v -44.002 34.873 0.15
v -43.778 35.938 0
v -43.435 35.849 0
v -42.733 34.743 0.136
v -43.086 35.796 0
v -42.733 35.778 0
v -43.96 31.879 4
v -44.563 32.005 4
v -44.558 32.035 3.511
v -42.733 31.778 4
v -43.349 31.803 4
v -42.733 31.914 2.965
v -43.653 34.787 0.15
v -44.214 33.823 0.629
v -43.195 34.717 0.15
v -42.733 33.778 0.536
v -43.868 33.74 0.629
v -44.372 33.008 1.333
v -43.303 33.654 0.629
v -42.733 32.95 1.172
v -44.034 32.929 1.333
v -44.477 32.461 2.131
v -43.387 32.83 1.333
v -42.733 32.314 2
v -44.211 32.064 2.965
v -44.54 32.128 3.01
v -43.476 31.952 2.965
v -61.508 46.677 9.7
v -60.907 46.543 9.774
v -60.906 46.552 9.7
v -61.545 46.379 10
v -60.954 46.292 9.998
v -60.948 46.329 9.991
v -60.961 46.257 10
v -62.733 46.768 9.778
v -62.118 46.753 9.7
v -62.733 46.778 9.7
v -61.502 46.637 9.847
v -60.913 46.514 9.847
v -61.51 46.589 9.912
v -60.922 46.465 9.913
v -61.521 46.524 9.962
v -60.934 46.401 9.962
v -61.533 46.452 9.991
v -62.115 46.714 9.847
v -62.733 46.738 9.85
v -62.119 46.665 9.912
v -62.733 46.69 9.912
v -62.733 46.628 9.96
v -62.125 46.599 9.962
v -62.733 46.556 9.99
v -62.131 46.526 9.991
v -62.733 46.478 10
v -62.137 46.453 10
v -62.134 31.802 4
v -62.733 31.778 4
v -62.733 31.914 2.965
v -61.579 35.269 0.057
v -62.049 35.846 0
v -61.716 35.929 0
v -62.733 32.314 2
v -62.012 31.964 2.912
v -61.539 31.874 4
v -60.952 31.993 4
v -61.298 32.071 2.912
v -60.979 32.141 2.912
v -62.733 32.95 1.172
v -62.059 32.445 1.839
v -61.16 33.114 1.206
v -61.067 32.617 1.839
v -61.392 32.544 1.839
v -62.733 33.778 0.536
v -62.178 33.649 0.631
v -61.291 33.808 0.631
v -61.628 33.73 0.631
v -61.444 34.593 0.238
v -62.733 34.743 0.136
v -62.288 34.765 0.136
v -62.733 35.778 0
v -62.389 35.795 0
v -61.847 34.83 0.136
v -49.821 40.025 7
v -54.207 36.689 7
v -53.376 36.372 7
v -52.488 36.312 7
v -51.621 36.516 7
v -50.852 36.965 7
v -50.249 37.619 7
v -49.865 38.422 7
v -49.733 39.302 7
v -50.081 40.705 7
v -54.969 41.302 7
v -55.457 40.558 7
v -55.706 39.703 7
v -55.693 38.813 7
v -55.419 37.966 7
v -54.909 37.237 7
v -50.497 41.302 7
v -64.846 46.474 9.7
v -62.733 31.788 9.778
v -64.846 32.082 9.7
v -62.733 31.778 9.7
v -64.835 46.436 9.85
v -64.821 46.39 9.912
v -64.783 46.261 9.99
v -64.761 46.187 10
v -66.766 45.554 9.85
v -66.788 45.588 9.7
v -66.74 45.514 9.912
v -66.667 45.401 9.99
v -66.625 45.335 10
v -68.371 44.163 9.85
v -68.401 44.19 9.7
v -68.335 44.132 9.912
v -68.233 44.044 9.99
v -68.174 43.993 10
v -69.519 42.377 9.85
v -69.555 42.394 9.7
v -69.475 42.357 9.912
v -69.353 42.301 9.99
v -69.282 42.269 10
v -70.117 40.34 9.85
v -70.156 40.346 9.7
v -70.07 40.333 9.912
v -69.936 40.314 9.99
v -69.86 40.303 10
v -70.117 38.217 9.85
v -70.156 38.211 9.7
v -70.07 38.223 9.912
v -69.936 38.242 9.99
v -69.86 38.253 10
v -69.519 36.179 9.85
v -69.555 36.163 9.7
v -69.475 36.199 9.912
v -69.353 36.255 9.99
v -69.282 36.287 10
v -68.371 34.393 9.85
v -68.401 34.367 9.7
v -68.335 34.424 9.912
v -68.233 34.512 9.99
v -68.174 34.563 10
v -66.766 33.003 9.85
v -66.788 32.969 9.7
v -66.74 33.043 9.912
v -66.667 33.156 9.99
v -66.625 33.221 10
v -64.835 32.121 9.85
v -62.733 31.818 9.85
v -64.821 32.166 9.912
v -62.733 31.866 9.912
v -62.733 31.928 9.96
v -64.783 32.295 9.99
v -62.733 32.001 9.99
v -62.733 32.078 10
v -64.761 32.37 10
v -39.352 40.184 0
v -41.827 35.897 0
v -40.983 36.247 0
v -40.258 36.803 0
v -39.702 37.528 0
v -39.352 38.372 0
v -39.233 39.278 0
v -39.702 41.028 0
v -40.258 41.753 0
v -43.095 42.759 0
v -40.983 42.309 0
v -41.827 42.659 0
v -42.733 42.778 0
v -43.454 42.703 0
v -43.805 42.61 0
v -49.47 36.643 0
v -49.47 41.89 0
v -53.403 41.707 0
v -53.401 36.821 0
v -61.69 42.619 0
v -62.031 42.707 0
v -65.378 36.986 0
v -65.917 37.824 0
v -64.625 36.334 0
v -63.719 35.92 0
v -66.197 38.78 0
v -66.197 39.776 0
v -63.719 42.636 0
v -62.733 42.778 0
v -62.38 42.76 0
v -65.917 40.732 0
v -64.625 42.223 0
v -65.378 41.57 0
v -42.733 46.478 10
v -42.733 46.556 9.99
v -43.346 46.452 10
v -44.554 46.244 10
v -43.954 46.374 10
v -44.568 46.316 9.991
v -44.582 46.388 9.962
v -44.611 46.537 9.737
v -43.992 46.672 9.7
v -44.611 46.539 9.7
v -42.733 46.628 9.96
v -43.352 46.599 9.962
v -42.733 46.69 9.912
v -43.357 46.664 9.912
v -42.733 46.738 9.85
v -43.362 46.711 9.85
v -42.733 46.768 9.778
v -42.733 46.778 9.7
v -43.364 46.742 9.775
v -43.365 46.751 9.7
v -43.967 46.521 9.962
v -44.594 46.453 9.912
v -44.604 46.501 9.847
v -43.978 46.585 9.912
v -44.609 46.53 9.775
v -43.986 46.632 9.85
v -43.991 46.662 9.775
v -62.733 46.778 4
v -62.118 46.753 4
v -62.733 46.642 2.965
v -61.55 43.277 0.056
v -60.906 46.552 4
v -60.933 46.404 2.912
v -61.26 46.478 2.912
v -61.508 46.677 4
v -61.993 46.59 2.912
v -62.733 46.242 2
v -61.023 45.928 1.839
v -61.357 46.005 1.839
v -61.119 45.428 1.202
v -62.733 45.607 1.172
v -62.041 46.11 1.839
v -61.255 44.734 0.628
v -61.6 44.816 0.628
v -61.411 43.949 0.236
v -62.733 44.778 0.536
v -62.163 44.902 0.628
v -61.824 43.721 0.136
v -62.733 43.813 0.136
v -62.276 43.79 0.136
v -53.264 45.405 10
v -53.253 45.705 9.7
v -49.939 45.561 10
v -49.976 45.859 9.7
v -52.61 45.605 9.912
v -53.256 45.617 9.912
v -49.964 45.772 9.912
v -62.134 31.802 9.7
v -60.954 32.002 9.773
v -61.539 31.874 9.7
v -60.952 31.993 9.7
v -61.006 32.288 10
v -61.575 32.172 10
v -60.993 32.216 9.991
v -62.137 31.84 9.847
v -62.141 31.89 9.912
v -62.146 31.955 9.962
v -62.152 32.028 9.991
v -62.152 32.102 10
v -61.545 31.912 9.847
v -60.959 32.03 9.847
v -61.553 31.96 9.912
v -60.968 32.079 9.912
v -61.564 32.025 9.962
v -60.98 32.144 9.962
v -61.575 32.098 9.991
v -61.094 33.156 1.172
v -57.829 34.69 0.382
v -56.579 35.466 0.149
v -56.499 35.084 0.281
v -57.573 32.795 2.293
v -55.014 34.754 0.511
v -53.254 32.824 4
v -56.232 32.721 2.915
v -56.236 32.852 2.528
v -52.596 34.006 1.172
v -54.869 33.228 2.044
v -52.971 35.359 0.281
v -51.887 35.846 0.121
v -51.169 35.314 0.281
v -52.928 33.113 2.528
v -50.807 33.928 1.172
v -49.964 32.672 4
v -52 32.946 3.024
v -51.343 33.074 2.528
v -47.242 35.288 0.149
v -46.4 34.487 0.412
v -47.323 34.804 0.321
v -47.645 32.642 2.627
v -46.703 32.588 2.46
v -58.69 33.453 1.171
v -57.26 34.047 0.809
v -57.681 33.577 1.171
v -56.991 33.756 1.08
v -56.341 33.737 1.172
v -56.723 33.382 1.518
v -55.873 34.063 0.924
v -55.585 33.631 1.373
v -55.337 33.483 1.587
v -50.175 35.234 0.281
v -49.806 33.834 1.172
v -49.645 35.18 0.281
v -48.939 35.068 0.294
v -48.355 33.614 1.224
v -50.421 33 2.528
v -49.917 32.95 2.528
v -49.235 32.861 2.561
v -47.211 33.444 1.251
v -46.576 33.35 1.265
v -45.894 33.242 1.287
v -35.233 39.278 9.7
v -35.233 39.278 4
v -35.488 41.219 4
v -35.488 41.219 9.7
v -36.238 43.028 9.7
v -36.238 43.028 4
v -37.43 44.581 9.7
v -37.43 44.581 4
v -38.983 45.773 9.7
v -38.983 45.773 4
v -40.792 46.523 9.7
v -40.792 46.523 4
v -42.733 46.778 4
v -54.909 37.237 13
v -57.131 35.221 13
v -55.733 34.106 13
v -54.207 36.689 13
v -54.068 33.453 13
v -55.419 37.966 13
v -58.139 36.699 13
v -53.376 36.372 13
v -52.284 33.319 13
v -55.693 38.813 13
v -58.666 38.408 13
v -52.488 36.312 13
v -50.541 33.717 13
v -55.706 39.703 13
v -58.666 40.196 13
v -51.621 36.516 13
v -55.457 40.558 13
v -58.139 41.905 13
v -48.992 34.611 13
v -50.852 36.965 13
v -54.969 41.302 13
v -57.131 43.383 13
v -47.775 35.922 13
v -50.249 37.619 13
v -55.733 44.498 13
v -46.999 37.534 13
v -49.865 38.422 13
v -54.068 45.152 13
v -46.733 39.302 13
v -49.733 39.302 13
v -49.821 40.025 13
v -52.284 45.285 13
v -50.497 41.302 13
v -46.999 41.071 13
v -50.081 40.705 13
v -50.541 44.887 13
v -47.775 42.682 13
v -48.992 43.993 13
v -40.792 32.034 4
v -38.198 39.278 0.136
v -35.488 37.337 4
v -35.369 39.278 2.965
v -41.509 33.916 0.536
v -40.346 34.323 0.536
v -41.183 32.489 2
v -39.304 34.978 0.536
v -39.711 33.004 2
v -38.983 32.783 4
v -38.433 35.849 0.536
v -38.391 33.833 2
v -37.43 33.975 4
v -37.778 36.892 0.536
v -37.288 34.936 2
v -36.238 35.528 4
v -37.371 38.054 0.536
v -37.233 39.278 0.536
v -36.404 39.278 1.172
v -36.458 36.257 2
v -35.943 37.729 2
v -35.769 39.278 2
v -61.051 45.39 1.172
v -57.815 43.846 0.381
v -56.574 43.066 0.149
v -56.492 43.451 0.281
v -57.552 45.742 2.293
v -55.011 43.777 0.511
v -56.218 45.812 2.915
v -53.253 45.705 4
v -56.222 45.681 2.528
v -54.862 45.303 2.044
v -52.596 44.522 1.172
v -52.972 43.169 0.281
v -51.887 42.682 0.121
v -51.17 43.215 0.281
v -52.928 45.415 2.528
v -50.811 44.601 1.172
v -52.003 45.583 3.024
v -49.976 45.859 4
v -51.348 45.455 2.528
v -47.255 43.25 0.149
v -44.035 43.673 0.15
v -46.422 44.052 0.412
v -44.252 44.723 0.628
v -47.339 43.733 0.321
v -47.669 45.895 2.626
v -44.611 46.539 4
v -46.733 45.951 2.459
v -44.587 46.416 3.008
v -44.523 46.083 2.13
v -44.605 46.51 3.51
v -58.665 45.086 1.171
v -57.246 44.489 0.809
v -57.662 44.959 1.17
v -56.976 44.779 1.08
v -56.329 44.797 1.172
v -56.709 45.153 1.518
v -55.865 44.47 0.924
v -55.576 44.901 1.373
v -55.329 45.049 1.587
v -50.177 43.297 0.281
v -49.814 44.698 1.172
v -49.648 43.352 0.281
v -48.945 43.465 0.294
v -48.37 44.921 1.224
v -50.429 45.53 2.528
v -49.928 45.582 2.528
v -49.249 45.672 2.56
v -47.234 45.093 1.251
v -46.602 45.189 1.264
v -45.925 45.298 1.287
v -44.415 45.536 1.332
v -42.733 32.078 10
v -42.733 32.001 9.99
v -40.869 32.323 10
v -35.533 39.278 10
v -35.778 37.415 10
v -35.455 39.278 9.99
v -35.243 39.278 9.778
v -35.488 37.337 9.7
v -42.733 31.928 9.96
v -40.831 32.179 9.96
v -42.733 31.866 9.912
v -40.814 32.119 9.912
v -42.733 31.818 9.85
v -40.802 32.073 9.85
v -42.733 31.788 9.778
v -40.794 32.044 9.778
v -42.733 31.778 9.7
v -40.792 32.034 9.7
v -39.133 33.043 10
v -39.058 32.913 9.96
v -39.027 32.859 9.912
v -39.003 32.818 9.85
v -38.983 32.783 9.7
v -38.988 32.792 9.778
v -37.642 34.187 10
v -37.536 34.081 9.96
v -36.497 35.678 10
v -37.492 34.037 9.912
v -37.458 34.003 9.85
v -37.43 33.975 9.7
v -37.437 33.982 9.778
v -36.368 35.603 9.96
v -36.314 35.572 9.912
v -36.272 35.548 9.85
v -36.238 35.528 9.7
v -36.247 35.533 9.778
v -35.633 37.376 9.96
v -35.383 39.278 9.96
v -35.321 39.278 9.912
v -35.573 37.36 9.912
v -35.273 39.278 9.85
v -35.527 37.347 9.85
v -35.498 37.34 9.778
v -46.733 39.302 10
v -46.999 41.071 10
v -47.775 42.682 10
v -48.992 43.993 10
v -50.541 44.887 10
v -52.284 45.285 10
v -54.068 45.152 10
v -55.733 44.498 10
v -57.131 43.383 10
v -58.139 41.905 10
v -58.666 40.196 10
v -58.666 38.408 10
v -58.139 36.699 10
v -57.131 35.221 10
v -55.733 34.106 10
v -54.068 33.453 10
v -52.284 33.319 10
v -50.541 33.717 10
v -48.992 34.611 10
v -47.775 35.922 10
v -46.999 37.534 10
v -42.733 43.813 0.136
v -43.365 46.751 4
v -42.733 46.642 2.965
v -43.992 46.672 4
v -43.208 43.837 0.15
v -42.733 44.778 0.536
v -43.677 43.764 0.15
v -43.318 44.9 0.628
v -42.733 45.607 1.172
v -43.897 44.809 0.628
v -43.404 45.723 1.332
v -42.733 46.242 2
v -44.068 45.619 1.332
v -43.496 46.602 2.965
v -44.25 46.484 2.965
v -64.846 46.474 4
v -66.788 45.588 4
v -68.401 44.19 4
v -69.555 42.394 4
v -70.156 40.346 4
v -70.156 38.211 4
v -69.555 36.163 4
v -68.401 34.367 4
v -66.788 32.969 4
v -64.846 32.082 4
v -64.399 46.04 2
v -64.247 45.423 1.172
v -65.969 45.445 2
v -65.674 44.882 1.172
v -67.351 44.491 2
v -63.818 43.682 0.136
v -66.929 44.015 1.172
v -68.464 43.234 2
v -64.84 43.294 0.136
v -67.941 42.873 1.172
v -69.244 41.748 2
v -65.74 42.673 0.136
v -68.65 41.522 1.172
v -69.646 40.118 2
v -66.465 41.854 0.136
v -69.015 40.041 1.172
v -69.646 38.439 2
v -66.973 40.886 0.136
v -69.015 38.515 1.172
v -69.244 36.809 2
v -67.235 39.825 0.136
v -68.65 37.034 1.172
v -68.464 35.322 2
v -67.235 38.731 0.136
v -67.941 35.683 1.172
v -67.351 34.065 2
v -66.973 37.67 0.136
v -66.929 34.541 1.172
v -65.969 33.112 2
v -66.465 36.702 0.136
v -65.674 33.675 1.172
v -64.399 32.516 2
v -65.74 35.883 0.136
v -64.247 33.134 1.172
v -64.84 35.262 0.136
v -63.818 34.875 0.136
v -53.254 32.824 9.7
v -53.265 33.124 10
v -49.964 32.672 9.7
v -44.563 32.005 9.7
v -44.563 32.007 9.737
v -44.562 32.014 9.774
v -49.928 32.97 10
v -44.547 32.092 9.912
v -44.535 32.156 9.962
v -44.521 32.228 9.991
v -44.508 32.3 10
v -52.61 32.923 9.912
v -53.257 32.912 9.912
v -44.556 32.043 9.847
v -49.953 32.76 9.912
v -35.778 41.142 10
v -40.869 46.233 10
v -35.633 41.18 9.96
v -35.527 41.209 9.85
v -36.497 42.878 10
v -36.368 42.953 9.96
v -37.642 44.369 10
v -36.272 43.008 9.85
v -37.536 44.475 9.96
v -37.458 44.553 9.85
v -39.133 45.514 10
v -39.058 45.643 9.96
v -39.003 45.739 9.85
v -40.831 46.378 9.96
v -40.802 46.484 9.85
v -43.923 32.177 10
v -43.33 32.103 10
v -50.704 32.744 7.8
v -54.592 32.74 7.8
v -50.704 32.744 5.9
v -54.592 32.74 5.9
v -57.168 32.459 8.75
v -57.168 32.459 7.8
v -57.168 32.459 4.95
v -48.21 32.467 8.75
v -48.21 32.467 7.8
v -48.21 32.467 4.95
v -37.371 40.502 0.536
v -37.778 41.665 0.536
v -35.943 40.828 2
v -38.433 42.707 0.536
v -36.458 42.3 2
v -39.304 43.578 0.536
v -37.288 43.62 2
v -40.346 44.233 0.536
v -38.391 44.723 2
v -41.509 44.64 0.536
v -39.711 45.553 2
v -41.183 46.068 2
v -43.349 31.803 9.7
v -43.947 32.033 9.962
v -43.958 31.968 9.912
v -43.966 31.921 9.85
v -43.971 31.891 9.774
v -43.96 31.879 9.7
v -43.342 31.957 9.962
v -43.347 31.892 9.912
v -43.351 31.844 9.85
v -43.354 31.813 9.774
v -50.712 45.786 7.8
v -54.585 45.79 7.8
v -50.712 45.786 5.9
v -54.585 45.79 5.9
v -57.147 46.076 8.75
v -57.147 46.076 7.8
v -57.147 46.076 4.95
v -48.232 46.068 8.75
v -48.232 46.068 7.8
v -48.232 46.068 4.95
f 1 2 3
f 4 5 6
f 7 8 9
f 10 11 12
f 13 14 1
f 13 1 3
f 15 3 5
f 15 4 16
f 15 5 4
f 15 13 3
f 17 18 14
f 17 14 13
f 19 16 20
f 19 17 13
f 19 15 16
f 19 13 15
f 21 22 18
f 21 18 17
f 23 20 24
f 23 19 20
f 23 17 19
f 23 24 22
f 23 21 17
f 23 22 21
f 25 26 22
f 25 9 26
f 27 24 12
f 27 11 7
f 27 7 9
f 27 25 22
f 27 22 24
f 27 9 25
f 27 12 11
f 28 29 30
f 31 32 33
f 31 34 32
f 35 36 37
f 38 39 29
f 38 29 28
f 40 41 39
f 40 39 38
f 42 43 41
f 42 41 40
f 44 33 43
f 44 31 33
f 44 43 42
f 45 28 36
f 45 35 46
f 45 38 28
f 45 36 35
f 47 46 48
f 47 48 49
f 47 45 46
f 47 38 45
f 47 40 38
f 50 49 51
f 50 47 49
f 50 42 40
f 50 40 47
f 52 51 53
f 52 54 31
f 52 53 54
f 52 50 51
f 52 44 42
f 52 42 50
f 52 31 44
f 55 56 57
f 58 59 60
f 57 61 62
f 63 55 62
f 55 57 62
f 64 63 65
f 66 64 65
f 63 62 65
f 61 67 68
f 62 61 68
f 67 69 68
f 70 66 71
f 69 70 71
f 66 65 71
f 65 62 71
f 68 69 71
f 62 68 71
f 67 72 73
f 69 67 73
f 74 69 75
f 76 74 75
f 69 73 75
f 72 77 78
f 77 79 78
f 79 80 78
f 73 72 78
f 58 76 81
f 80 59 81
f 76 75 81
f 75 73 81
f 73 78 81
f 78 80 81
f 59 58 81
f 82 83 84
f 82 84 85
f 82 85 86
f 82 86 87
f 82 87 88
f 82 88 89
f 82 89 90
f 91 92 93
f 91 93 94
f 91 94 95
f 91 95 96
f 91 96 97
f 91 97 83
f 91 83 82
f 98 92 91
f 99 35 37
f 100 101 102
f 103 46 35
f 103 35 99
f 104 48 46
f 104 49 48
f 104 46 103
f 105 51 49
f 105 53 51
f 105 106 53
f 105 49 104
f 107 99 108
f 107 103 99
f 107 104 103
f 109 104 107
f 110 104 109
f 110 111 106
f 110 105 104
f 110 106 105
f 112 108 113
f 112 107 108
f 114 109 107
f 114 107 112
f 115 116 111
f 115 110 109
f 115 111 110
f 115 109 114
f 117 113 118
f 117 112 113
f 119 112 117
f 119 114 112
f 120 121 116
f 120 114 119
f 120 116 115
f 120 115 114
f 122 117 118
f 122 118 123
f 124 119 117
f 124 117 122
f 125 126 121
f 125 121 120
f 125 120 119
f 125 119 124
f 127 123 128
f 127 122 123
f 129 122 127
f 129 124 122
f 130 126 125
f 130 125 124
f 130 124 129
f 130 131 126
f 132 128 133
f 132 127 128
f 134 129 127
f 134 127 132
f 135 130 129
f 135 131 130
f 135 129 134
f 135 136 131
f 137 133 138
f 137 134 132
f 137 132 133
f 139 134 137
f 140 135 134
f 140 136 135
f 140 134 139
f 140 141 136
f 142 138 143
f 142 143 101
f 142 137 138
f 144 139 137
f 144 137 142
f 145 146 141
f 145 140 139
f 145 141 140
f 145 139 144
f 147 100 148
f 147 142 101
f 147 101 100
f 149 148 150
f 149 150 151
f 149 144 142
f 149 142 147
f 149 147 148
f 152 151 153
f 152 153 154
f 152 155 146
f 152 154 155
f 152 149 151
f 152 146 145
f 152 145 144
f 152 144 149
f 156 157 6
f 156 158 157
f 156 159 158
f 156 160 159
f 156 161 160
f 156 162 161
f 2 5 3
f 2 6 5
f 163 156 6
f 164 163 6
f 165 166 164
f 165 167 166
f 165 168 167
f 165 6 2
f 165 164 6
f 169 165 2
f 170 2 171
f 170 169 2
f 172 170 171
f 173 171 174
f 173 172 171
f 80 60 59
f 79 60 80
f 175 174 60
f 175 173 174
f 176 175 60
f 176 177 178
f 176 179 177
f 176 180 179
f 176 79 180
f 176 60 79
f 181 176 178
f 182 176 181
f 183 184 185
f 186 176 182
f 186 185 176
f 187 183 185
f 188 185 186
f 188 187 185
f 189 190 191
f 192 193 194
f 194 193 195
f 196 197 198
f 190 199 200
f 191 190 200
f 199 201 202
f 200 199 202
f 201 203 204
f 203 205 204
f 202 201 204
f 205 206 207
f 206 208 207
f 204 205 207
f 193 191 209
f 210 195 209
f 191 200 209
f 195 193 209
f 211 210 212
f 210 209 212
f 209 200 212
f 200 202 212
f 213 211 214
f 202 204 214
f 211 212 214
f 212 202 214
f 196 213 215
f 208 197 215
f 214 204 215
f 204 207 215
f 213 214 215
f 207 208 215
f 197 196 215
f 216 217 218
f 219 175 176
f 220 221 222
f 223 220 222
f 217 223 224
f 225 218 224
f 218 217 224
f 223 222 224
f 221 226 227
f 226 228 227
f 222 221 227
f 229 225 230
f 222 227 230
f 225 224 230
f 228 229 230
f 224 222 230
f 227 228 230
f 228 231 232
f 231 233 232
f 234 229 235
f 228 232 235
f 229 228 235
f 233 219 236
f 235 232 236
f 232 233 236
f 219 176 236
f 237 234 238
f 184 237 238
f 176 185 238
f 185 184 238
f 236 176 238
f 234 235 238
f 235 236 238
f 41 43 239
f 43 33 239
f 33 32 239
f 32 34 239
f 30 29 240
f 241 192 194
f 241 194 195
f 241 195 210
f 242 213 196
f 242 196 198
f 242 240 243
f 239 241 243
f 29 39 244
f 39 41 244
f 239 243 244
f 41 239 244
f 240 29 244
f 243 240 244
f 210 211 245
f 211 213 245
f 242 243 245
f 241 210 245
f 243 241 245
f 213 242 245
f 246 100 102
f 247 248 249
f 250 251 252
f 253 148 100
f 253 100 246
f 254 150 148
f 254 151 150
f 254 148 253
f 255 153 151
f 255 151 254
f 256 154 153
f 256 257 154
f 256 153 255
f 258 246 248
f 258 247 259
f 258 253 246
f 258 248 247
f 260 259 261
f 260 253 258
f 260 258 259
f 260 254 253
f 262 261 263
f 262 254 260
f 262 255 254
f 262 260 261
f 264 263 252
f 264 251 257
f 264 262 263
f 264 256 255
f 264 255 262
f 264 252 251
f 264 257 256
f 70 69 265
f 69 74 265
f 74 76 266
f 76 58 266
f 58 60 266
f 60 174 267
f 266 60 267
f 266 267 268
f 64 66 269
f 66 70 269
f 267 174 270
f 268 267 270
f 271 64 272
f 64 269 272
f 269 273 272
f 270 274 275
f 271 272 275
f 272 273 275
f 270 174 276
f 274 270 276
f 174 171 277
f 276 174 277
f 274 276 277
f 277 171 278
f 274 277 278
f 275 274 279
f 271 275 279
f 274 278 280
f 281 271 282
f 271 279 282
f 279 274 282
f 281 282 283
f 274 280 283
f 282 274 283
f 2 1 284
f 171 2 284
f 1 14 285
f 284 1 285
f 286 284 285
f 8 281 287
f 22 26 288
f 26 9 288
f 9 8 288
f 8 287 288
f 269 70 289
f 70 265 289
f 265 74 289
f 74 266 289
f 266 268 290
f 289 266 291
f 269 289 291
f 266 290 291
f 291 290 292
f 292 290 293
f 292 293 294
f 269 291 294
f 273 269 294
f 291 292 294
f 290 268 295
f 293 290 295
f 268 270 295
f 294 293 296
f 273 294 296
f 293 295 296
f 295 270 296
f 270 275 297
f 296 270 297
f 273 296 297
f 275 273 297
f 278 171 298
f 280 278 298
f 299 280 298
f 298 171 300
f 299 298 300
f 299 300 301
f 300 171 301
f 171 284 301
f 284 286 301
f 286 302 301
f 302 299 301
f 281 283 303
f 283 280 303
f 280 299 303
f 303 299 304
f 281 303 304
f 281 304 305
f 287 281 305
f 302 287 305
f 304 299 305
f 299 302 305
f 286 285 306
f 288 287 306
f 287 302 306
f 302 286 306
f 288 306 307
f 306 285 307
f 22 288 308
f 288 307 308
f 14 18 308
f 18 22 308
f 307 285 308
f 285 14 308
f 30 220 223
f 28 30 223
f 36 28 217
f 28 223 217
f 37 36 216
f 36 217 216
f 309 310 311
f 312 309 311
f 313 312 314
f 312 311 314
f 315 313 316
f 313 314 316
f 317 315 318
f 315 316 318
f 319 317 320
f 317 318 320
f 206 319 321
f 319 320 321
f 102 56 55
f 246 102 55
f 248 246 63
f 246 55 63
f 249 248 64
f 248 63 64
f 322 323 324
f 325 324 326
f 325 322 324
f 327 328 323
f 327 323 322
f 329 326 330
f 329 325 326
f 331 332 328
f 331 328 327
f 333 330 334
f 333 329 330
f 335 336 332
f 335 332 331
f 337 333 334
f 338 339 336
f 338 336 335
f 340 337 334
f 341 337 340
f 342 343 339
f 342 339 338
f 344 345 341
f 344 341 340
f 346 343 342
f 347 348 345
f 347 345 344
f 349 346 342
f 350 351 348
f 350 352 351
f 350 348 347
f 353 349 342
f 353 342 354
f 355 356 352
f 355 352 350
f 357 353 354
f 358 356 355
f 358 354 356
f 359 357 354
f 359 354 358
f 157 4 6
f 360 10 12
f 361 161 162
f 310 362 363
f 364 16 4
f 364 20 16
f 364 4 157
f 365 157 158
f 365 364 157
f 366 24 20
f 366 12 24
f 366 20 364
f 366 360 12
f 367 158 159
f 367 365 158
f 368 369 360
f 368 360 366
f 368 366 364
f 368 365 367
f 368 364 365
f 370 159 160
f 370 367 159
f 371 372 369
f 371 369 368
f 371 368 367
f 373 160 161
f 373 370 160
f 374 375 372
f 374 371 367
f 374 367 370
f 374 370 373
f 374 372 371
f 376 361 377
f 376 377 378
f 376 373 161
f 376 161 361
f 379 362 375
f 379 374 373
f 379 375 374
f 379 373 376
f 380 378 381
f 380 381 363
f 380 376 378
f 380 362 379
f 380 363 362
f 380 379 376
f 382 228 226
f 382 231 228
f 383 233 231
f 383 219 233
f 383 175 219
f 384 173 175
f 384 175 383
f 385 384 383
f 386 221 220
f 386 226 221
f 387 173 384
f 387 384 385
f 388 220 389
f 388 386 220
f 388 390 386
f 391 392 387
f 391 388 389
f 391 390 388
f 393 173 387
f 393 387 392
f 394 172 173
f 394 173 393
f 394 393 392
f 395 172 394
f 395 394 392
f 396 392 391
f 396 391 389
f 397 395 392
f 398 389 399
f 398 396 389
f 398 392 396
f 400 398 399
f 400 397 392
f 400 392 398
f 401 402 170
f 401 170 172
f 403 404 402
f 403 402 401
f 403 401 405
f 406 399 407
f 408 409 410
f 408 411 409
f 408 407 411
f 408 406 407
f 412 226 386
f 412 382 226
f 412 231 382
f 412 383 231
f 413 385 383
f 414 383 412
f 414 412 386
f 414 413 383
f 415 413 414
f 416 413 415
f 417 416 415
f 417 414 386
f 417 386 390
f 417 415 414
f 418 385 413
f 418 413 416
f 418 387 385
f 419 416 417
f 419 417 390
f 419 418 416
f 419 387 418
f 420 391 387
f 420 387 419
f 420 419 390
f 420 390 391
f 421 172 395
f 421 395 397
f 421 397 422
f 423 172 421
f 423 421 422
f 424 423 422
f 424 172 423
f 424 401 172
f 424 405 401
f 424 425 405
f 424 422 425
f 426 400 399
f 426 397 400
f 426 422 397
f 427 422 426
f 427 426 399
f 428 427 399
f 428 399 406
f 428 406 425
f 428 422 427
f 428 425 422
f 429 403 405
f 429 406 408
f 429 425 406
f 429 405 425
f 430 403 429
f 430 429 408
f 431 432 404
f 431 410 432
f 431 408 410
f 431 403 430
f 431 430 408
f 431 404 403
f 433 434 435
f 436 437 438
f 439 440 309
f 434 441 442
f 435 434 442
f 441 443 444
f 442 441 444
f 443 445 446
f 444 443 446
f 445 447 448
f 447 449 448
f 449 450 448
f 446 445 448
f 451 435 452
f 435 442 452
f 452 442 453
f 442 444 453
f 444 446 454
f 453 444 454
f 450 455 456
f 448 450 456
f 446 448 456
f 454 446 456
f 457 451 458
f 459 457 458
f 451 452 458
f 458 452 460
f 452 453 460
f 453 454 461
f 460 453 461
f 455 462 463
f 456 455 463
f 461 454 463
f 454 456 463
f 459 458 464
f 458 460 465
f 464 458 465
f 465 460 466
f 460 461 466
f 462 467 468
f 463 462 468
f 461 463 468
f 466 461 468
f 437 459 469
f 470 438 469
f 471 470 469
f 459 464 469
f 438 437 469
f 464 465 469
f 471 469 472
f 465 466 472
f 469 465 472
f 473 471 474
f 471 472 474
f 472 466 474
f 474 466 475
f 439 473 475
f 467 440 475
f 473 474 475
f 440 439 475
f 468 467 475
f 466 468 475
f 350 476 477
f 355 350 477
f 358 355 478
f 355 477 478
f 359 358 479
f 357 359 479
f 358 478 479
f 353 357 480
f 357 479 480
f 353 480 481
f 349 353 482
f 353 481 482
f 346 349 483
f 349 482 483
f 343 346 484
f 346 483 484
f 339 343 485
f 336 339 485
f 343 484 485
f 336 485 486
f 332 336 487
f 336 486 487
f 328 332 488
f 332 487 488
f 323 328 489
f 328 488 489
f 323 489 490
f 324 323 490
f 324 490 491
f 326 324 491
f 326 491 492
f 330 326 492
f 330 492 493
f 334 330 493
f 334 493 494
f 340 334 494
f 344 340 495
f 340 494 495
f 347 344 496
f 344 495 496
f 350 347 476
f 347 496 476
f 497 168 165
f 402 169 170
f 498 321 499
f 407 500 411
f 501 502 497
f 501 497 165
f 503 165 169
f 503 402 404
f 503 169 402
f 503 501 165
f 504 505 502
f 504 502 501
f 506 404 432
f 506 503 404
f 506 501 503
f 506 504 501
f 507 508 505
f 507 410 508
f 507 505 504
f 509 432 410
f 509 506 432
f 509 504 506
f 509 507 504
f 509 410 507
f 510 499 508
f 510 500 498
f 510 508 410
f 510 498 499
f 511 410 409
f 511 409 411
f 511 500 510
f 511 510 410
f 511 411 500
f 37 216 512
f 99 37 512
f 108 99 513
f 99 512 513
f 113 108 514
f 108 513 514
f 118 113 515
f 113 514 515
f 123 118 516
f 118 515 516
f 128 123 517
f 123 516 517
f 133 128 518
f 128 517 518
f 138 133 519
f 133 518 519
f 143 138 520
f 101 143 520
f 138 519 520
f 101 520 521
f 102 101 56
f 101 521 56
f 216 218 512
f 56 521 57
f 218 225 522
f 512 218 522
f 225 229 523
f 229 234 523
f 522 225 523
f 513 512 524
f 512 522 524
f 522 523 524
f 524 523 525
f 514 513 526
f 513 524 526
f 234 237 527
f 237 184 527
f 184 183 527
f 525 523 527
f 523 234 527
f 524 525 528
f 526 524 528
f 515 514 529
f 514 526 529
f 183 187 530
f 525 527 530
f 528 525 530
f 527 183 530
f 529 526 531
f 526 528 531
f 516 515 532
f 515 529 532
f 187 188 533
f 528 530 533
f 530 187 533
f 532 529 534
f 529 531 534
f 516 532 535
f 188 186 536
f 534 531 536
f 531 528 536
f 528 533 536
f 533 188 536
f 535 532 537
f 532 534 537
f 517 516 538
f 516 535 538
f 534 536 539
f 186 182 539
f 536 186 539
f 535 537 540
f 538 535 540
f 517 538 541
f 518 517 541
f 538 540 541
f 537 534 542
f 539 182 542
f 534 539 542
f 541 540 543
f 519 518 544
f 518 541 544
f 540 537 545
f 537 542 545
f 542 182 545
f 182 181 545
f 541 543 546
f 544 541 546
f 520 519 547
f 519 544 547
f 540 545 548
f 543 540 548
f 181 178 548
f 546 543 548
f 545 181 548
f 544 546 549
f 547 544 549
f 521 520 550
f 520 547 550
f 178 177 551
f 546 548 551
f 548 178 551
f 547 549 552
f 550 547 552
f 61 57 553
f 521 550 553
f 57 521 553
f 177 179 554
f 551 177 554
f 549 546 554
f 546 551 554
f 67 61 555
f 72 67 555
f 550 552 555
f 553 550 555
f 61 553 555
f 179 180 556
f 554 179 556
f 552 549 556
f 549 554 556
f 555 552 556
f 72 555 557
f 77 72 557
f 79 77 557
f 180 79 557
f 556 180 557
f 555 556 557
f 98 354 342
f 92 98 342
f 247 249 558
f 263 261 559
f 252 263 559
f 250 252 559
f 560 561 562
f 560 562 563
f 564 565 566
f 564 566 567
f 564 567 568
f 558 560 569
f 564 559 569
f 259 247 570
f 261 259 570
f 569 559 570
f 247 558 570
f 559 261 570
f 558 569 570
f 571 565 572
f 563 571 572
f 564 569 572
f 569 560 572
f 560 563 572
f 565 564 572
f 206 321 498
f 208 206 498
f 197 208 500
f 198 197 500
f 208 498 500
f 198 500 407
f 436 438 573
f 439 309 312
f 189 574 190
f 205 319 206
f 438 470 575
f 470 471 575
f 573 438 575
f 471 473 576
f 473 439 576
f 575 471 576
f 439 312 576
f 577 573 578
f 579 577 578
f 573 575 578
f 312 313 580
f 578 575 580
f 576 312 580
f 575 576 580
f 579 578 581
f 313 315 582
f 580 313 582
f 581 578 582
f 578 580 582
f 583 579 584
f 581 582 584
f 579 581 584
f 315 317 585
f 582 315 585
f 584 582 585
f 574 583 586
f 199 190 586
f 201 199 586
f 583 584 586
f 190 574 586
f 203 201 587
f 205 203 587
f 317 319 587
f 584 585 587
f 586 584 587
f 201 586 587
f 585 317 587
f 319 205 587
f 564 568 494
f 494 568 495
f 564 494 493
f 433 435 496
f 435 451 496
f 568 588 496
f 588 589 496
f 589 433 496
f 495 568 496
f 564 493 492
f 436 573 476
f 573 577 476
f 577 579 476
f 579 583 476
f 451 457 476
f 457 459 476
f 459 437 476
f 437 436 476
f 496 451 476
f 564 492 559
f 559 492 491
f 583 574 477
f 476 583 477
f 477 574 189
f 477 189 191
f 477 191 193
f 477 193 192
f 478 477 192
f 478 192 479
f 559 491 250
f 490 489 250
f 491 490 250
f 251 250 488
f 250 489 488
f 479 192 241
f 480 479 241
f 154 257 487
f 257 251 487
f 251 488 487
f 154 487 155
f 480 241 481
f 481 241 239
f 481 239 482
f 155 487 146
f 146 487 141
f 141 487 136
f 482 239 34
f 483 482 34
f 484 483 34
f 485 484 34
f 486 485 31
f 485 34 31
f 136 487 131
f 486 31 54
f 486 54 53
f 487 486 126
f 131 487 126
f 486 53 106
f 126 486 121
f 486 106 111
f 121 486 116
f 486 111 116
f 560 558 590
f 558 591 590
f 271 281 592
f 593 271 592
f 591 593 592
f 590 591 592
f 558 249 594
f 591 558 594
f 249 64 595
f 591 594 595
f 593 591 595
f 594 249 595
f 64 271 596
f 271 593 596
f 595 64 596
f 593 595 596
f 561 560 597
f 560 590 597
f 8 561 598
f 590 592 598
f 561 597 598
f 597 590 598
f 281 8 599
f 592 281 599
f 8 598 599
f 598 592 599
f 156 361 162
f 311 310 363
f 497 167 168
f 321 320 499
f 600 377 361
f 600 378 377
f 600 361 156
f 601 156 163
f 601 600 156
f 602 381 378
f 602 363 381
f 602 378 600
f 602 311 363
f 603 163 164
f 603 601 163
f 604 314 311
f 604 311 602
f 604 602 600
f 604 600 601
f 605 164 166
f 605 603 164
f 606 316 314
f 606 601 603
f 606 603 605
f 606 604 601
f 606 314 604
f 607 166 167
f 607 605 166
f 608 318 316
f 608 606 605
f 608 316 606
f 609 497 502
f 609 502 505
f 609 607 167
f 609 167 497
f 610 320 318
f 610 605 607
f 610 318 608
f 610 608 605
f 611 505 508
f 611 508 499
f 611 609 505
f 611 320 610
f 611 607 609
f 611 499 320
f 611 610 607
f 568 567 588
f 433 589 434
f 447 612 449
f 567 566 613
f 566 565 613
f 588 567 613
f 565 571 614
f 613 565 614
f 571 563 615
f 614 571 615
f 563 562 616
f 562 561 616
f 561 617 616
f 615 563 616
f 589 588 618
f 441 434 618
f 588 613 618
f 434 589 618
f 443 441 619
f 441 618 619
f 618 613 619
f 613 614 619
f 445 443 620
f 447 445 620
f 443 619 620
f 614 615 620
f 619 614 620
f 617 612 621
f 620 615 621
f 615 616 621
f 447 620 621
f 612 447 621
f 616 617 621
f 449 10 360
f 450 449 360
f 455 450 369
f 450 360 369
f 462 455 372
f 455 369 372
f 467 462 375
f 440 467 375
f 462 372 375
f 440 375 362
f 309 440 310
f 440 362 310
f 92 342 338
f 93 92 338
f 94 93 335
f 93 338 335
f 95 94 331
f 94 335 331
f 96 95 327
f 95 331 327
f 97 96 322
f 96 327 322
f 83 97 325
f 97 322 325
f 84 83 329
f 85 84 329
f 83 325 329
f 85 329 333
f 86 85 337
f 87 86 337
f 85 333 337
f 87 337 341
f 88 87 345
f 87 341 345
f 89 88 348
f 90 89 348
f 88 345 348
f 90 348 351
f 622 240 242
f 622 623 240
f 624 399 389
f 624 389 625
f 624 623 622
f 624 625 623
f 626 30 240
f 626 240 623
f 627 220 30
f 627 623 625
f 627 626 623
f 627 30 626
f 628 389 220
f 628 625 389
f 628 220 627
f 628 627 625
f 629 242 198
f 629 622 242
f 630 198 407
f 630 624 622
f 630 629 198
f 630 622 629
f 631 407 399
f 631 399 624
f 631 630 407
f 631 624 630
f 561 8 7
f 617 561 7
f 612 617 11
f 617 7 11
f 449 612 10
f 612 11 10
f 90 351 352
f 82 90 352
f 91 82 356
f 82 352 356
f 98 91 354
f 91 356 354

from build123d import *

# Parameters (mm, degrees)
F1_DEPTH = 10
F2_R     = 6
F3_DEPTH = 3
F5_DEPTH = 6
F6_R     = 0.3
F7_R     = 4


with BuildPart() as f1:
    # F0 (on Top) → F1 (new body)
    with BuildSketch(Plane.XY):
        with BuildLine():
            add(Edge.make_bspline(
                [(-62.732838, 46.778165), (-62.079037, 46.698432), (-61.471616, 46.623094), (-60.905515, 46.552152)],
                knots=[0, 0, 0, 0, 1.102453, 1.102453, 1.102453, 1.102453], degree=3))
            ThreePointArc((-62.732838, 46.778165), (-70.232838, 39.278165), (-62.732838, 31.778165))
            add(Edge.make_bspline(
                [(-62.732838, 31.778165), (-62.096927, 31.853706), (-61.504893, 31.925197), (-60.952079, 31.992638)],
                knots=[0, 0, 0, 0, 1.072287, 1.072287, 1.072287, 1.072287], degree=3))
            ThreePointArc((-60.952079, 31.992638), (-56.833444, 34.647057), (-55.232838, 39.278165))
            ThreePointArc((-55.232838, 39.278165), (-56.818663, 43.890381), (-60.905515, 46.552152))
        make_face()
        with BuildLine():
            ThreePointArc((-60.905515, 46.552152), (-61.812214, 46.721447), (-62.732838, 46.778165))
            add(Edge.make_bspline(
                [(-62.732838, 46.778165), (-62.079037, 46.698432), (-61.471616, 46.623094), (-60.905515, 46.552152)],
                knots=[0, 0, 0, 0, 1.102453, 1.102453, 1.102453, 1.102453], degree=3))
        make_face()
        with BuildLine():
            add(Edge.make_bspline(
                [(-62.732838, 31.778165), (-62.096927, 31.853706), (-61.504893, 31.925197), (-60.952079, 31.992638)],
                knots=[0, 0, 0, 0, 1.072287, 1.072287, 1.072287, 1.072287], degree=3))
            ThreePointArc((-62.732838, 31.778165), (-61.836024, 31.831976), (-60.952079, 31.992638))
        make_face()
        with BuildLine():
            add(Edge.make_bspline(
                [(-60.905515, 46.552152), (-51.802553, 45.411389), (-53.383665, 45.407059), (-44.61111, 46.539163)],
                knots=[1.102453, 1.102453, 1.102453, 1.102453, 18.830007, 18.830007, 18.830007, 18.830007], degree=3))
            ThreePointArc((-60.905515, 46.552152), (-56.818663, 43.890381), (-55.232838, 39.278165))
            ThreePointArc((-55.232838, 39.278165), (-56.833444, 34.647057), (-60.952079, 31.992638))
            add(Edge.make_bspline(
                [(-60.952079, 31.992638), (-51.78057, 33.111525), (-53.404426, 33.115633), (-44.563286, 32.004963)],
                knots=[1.072287, 1.072287, 1.072287, 1.072287, 18.862152, 18.862152, 18.862152, 18.862152], degree=3))
            ThreePointArc((-44.563286, 32.004963), (-50.232797, 39.253486), (-44.61111, 46.539163))
        make_face()
        with BuildLine():
            add(Edge.make_bspline(
                [(-44.61111, 46.539163), (-44.032134, 46.61388), (-43.408059, 46.693547), (-42.732838, 46.778165)],
                knots=[18.830007, 18.830007, 18.830007, 18.830007, 20, 20, 20, 20], degree=3))
            ThreePointArc((-44.61111, 46.539163), (-50.232797, 39.253486), (-44.563286, 32.004963))
            add(Edge.make_bspline(
                [(-44.563286, 32.004963), (-43.997803, 31.933924), (-43.389508, 31.858324), (-42.732838, 31.778165)],
                knots=[18.862152, 18.862152, 18.862152, 18.862152, 20, 20, 20, 20], degree=3))
            ThreePointArc((-42.732838, 31.778165), (-37.429537, 33.974864), (-35.232838, 39.278165))
            ThreePointArc((-35.232838, 39.278165), (-37.429537, 44.581465), (-42.732838, 46.778165))
        make_face()
        with BuildLine():
            ThreePointArc((-42.732838, 46.778165), (-43.679547, 46.718174), (-44.61111, 46.539163))
            add(Edge.make_bspline(
                [(-44.61111, 46.539163), (-44.032134, 46.61388), (-43.408059, 46.693547), (-42.732838, 46.778165)],
                knots=[18.830007, 18.830007, 18.830007, 18.830007, 20, 20, 20, 20], degree=3))
        make_face()
        with BuildLine():
            add(Edge.make_bspline(
                [(-44.563286, 32.004963), (-43.997803, 31.933924), (-43.389508, 31.858324), (-42.732838, 31.778165)],
                knots=[18.862152, 18.862152, 18.862152, 18.862152, 20, 20, 20, 20], degree=3))
            ThreePointArc((-44.563286, 32.004963), (-43.65506, 31.83508), (-42.732838, 31.778165))
        make_face()
    extrude(amount=F1_DEPTH)

    # F2 (on face) → F3 (join)
    with BuildSketch(Plane.XY.offset(10)):
        with Locations((-52.7328, 39.302151)):
            Circle(F2_R)
    extrude(amount=F3_DEPTH)

    # F4 (on face) → F5 (cut)
    with BuildSketch(Plane.XY.offset(13)):
        with BuildLine():
            ThreePointArc((-54.968868, 41.302151), (-53.803266, 36.499634), (-49.7328, 39.302151))
            ThreePointArc((-49.7328, 39.302151), (-49.930283, 40.372617), (-50.496732, 41.302151))
            Line((-50.496732, 41.302151), (-54.968868, 41.302151))
        make_face()
    extrude(amount=-F5_DEPTH, mode=Mode.SUBTRACT)

    # F6
    f6_edges = [f1.edges().sort_by_distance(p)[0] for p in [
        (-70.17612, 40.198788, 10),
        (-52.758079, 45.693906, 10),
        (-35.232879, 39.302843, 10),
        (-52.757446, 32.834331, 10),
    ]]
    fillet(f6_edges, radius=F6_R)

    # F7
    f7_edges = [f1.edges().sort_by_distance(p)[0] for p in [
        (-70.17612, 40.198788, 0),
        (-52.758079, 45.693906, 0),
        (-35.232879, 39.302843, 0),
        (-52.757446, 32.834331, 0),
        (-61.836024, 31.831976, 0),
    ]]
    fillet(f7_edges, radius=F7_R)


solid = f1.part
